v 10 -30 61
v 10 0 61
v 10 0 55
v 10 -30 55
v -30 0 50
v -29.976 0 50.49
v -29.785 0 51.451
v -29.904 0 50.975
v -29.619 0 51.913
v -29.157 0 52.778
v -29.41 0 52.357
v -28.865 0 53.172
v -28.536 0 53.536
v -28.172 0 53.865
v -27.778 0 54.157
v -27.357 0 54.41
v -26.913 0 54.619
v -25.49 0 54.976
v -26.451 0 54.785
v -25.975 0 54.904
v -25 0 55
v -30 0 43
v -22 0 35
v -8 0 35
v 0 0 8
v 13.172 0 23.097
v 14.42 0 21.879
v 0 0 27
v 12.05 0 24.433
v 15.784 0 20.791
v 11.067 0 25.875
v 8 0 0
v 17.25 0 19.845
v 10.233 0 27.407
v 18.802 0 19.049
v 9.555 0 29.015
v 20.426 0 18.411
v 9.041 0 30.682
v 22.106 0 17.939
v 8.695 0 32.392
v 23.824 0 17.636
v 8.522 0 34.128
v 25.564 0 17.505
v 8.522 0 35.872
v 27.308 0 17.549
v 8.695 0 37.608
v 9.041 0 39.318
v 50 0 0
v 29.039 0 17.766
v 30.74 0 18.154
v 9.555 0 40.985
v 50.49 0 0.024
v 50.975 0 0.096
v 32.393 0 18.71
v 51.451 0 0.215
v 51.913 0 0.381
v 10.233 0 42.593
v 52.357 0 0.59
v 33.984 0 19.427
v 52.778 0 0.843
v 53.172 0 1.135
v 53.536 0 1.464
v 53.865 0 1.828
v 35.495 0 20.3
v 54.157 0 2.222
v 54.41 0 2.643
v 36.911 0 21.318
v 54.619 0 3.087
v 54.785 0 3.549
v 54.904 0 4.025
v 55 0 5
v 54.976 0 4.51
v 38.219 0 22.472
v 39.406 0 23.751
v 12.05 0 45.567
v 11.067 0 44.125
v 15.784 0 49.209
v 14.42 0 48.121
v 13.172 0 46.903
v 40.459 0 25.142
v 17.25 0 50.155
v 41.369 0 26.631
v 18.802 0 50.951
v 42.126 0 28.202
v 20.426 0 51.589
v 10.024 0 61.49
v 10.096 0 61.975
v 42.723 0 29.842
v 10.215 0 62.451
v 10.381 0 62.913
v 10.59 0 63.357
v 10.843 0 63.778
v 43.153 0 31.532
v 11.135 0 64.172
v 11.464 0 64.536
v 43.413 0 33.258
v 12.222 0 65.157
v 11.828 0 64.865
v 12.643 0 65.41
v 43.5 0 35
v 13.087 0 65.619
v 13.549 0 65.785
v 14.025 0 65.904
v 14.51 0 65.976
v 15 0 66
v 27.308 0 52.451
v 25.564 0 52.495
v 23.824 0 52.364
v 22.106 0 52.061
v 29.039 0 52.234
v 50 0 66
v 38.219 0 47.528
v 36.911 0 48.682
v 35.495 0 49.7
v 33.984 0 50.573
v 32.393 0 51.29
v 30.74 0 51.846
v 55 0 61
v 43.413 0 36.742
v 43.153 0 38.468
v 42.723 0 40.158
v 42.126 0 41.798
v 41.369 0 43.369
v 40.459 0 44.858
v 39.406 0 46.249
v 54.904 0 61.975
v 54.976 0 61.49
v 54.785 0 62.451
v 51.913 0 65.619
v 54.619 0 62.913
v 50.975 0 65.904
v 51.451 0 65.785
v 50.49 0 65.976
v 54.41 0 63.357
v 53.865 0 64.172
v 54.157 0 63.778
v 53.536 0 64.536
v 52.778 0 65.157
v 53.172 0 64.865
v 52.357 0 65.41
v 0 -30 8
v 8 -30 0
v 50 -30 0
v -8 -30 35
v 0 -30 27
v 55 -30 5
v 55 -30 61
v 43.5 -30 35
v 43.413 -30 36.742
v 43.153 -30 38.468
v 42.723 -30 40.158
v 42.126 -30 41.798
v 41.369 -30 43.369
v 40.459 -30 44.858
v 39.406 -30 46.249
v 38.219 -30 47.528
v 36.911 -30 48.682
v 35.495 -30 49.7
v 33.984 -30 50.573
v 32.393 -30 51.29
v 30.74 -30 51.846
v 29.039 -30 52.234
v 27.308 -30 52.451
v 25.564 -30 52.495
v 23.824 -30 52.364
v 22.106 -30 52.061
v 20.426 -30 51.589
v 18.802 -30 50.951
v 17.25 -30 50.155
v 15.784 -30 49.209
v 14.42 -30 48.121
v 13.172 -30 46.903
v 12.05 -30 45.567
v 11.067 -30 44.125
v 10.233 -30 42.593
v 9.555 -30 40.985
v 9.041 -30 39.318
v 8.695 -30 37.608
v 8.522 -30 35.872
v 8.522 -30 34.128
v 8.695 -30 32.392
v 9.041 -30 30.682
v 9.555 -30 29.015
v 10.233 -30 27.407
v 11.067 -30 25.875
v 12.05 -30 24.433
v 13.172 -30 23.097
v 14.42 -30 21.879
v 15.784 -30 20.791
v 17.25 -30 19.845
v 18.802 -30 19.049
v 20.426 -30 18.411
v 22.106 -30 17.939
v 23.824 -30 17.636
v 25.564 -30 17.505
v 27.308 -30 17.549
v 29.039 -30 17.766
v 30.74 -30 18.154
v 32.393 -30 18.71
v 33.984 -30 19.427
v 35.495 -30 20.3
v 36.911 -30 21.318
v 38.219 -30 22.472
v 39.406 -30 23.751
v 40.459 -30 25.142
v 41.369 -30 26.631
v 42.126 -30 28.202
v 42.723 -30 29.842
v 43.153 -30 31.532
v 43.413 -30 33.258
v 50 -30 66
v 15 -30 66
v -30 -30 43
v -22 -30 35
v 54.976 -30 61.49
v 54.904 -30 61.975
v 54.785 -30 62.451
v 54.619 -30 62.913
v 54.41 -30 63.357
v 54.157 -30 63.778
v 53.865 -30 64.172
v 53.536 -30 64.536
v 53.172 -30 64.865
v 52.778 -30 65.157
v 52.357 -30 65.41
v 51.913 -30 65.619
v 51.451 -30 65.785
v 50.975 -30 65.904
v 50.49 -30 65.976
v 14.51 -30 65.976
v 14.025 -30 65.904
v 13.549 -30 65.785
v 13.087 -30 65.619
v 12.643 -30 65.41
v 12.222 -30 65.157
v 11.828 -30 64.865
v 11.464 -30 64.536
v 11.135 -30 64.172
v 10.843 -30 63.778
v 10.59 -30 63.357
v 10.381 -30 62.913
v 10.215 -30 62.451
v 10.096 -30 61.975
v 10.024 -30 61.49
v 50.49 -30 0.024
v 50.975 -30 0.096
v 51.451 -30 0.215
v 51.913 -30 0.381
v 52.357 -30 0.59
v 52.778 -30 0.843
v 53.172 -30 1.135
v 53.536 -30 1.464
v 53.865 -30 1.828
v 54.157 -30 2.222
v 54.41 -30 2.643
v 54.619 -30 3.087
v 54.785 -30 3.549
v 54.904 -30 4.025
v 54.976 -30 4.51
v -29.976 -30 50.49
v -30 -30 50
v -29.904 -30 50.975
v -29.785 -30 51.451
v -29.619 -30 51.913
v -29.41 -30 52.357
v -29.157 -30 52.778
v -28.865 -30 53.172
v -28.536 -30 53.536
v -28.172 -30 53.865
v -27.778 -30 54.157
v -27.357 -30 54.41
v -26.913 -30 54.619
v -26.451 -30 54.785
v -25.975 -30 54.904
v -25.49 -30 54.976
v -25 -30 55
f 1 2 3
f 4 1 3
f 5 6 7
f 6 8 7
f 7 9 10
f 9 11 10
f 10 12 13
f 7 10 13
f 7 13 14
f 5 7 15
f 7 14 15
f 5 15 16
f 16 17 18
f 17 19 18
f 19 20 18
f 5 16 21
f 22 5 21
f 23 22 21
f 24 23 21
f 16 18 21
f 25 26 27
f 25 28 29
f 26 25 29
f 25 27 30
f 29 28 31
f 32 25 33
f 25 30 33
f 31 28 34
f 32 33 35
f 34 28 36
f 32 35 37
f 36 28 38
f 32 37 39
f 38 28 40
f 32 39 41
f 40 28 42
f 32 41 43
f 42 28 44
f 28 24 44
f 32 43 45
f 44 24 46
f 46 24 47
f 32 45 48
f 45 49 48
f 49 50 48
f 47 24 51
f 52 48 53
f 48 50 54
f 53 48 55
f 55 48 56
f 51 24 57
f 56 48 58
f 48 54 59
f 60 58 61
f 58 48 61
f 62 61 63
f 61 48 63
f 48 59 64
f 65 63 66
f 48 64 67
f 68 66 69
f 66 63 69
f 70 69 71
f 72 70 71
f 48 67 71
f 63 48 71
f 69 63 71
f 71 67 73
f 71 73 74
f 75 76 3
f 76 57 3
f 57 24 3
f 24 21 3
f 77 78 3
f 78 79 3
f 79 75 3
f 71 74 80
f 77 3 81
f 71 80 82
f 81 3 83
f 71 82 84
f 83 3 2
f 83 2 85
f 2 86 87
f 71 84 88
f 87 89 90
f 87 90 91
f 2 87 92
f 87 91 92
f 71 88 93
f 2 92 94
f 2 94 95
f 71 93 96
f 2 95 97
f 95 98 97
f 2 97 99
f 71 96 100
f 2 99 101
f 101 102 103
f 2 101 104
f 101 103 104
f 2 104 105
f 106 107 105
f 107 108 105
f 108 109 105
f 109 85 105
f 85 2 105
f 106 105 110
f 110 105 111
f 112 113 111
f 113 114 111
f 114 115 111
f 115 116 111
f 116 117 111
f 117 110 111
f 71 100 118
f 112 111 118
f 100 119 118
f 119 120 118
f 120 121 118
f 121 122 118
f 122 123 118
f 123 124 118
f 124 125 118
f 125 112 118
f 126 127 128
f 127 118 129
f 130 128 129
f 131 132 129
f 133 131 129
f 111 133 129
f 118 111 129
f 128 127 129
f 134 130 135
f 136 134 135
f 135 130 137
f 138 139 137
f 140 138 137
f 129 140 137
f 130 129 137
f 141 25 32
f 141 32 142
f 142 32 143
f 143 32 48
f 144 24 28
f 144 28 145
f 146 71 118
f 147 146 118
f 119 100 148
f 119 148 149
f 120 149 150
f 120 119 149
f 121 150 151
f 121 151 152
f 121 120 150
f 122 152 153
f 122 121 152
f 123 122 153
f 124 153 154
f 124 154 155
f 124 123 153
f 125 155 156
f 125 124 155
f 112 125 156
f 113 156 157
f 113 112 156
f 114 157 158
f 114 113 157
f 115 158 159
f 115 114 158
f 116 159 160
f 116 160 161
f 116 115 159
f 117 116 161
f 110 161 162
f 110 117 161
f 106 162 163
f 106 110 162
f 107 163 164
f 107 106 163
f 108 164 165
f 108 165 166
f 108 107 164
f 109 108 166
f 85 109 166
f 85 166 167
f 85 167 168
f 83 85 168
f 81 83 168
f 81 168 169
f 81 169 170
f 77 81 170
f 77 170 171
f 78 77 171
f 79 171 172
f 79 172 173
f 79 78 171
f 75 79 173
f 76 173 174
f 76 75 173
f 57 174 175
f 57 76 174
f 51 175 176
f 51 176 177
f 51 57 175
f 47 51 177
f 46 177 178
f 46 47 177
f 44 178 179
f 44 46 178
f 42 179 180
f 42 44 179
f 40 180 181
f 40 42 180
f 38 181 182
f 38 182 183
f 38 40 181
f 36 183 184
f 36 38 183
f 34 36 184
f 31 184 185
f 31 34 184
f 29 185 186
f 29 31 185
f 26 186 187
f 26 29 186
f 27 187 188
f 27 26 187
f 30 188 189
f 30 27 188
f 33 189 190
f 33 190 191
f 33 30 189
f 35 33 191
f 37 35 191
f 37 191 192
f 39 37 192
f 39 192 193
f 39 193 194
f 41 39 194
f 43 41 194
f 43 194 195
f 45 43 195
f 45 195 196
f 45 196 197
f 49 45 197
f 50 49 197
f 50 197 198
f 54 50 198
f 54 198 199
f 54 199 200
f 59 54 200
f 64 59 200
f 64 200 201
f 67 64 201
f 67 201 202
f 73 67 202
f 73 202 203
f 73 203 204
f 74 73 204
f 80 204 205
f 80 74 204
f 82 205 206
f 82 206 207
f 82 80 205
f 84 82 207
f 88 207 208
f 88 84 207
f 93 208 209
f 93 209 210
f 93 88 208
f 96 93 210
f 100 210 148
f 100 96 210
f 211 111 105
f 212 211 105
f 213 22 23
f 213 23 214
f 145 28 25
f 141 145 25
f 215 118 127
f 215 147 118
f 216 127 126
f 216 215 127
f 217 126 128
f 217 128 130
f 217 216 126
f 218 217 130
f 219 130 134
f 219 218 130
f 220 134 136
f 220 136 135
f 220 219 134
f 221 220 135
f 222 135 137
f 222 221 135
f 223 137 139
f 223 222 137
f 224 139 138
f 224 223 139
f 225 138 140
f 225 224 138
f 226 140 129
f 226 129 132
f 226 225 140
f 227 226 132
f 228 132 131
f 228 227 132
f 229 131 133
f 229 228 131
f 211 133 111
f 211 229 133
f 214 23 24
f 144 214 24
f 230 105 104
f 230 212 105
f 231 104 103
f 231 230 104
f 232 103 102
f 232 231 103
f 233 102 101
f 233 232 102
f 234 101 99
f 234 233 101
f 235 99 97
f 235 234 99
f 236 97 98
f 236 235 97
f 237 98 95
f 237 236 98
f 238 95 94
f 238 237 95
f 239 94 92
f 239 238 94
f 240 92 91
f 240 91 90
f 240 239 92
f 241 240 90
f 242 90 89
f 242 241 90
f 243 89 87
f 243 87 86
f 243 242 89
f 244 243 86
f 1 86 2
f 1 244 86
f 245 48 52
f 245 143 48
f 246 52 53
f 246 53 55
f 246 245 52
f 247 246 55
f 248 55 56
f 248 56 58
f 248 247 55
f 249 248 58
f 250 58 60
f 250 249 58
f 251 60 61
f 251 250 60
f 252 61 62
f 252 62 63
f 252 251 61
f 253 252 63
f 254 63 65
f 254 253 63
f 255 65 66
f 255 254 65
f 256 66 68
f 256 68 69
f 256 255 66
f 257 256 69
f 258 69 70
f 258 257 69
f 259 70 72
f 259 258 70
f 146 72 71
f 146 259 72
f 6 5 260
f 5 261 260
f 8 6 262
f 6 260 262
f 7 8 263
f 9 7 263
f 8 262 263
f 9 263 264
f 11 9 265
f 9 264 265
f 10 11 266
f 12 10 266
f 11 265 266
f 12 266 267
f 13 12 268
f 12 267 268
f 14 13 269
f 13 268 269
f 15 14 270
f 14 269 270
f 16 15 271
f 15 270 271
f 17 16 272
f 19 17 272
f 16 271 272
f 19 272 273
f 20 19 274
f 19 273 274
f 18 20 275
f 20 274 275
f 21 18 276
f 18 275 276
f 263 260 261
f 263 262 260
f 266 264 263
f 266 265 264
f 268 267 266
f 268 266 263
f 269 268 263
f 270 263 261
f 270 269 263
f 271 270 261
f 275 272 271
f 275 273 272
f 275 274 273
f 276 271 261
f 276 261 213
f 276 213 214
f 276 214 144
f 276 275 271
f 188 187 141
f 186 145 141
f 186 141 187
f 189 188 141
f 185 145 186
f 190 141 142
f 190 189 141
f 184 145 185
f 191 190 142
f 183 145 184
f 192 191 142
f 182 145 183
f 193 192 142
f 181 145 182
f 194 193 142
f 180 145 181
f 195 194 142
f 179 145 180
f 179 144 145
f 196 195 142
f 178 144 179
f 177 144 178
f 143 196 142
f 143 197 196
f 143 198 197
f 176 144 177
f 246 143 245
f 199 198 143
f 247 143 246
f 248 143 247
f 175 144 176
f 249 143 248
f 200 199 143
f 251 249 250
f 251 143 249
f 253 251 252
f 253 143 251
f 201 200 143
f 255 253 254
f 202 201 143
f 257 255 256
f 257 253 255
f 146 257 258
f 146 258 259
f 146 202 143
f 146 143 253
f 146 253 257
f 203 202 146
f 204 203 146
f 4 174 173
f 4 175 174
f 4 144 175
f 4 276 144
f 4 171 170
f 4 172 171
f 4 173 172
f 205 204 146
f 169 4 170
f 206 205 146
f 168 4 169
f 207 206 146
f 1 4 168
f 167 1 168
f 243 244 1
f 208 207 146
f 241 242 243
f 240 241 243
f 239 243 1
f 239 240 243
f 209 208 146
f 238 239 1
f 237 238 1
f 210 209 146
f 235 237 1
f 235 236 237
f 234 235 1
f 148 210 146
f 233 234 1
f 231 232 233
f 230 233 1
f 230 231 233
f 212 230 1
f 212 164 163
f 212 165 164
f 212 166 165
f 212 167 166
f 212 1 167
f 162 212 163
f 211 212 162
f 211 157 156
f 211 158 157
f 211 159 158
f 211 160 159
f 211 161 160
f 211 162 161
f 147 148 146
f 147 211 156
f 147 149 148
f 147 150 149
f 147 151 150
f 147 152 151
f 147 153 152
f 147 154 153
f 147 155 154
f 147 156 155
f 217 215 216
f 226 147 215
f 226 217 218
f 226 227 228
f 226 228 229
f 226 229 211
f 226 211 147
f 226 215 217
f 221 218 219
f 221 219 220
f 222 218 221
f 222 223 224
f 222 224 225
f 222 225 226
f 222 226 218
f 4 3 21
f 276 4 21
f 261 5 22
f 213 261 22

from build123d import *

# Parameters (mm, degrees)
F0_R     = 17.5
F1_DEPTH = 30
F2_R     = 5
F3_SIZE  = 8


with BuildPart() as f1:
    # F0 (on Front) → F1 (new body)
    with BuildSketch(Plane.XZ):
        Polygon((0, 35), (0, 0), (55, 0), (55, 66), (10, 66), (10, 55), (-30, 55), (-30, 35), align=None)
        with Locations((26, 35)):
            Circle(F0_R, mode=Mode.SUBTRACT)
    extrude(amount=F1_DEPTH)

    # F2
    f2_edges = [f1.edges().sort_by_distance(p)[0] for p in [
        (10, -15, 66),
        (55, -15, 66),
        (55, -15, 0),
        (-30, -15, 55),
    ]]
    fillet(f2_edges, radius=F2_R)

    # F3
    f3_edges = [f1.edges().sort_by_distance(p)[0] for p in [
        (0, -15, 35),
        (-30, -15, 35),
        (0, -15, 0),
    ]]
    chamfer(f3_edges, length=F3_SIZE)


solid = f1.part
